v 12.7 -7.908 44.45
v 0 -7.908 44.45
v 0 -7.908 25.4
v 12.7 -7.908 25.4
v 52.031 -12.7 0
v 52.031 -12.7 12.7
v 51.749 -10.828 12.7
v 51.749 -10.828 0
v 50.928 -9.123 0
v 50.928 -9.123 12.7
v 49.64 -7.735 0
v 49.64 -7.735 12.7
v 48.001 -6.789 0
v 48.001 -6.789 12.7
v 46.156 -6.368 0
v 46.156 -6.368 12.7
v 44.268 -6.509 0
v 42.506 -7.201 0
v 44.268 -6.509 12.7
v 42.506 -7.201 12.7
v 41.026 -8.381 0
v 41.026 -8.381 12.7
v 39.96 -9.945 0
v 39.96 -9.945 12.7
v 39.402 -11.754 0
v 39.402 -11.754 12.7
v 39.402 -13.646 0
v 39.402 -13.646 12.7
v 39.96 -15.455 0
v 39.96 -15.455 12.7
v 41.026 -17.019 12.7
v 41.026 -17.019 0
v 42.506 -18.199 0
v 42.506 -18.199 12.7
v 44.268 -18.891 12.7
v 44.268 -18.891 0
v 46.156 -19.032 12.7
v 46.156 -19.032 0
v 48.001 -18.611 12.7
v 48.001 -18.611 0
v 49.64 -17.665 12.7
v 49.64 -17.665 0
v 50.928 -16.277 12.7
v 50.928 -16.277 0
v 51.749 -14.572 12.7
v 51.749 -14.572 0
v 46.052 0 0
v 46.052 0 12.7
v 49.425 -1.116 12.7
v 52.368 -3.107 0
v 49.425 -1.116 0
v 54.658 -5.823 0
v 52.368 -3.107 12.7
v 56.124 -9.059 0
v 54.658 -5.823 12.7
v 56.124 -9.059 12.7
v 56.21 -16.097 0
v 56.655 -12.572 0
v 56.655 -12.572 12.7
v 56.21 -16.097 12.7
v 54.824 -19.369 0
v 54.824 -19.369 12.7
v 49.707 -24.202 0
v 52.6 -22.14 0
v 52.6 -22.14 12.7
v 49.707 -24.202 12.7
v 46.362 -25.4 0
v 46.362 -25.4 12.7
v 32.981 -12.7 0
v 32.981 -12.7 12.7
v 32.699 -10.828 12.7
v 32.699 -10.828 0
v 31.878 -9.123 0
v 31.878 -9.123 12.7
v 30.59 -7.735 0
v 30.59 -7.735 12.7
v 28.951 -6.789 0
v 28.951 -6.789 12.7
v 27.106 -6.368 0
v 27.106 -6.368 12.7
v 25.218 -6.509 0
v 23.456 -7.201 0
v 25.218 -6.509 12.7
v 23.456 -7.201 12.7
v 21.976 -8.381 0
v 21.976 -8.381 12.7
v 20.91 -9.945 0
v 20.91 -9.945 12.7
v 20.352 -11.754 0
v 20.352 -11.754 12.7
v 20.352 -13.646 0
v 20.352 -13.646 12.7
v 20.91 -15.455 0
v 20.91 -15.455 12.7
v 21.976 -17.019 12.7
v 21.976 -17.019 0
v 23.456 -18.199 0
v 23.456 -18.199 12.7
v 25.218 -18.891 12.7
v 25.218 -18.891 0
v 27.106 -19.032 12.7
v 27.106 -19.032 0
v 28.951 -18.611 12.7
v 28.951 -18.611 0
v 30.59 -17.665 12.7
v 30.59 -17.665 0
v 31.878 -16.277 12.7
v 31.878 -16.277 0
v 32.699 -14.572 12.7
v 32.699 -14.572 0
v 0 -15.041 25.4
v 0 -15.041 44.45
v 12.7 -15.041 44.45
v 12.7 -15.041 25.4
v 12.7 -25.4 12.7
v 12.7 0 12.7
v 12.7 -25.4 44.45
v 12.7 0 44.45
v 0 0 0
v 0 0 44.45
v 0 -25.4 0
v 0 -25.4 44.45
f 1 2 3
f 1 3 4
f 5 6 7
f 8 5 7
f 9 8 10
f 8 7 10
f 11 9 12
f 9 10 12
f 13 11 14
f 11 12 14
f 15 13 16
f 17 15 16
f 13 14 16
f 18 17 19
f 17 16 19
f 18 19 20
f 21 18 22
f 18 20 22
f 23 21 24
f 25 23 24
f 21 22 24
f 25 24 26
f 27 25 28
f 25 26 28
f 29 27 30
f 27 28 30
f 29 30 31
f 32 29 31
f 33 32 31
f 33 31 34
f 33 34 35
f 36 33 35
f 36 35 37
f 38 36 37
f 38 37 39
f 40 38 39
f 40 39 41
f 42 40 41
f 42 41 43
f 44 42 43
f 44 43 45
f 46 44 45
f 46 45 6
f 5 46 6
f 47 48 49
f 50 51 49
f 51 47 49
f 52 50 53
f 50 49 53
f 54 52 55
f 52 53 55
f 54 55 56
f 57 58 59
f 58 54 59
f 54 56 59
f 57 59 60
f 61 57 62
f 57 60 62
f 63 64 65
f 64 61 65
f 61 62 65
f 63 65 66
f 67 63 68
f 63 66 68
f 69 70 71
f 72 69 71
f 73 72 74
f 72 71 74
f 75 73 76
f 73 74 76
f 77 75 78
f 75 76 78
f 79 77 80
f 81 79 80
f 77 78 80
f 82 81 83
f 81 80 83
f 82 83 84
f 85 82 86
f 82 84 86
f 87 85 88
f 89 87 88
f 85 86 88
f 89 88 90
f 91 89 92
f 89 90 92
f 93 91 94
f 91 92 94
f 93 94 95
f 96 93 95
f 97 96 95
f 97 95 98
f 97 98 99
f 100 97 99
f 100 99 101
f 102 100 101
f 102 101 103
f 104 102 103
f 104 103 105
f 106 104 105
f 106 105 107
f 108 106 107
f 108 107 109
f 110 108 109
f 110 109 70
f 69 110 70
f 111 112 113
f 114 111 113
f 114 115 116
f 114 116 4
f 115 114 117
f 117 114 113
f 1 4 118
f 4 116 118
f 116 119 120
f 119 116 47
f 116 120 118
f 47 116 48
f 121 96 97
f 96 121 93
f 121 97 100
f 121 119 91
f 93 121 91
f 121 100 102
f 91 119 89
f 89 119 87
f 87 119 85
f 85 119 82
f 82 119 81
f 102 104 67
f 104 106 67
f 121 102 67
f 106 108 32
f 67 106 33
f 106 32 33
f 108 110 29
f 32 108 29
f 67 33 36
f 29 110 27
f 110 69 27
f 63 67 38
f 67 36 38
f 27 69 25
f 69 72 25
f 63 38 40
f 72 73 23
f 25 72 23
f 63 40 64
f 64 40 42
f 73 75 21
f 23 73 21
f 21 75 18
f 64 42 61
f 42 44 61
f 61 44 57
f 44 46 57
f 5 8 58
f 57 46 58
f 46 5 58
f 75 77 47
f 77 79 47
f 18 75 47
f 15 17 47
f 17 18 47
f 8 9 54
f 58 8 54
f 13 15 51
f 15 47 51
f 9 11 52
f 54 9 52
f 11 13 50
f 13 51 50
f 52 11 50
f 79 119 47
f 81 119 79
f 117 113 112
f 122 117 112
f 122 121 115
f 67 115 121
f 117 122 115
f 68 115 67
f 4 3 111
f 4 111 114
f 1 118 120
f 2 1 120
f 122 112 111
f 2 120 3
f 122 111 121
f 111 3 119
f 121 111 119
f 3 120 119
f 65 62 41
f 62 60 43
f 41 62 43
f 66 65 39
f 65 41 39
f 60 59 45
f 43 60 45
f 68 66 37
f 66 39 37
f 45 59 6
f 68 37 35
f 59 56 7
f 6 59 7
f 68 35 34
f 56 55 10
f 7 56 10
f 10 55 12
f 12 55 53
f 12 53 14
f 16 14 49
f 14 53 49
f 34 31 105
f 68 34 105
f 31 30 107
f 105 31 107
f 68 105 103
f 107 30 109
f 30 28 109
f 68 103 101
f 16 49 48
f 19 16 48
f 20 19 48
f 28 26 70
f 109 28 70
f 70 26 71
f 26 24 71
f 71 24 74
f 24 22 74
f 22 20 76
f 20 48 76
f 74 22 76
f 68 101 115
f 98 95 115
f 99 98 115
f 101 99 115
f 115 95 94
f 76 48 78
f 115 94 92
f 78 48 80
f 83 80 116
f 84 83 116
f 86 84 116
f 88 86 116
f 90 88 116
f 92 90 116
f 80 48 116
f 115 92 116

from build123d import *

# Parameters (mm, degrees)
F1_DEPTH = 25.4
F3_R     = 6.35
F4_DEPTH = 25.4
F6_DEPTH = 25.4
F7_W     = 12.7
F7_H     = 7.132675
F8_DEPTH = 19.05


with BuildPart() as f1:
    # F0 (on Front) → F1 (new body)
    with BuildSketch(Plane.XZ):
        Polygon((0, 44.45), (0, 0), (57.15, 0), (57.15, 12.7), (12.7, 12.7), (12.7, 44.45), align=None)
    extrude(amount=F1_DEPTH)

    # F3 (on face) → F4 (cut)
    with BuildSketch(Plane.XY.offset(12.7)):
        with Locations((26.631284, -12.7)):
            Circle(F3_R)
        with Locations((45.681284, -12.7)):
            Circle(F3_R)
    extrude(amount=-F4_DEPTH, mode=Mode.SUBTRACT)

    # F5 (on face) → F6 (cut)
    with BuildSketch(Plane.XY.offset(12.7)):
        with BuildLine():
            ThreePointArc((46.05227, 0), (56.65458, -12.572447), (46.362385, -25.4))
            Line((46.362385, -25.4), (57.15, -25.4))
            Line((57.15, -25.4), (57.15, 0))
            Line((57.15, 0), (46.05227, 0))
        make_face()
    extrude(amount=-F6_DEPTH, mode=Mode.SUBTRACT)

    # F7 (on face) → F8 (cut)
    with BuildSketch(Plane.XY.offset(44.45)):
        with Locations((6.35, -11.474303)):
            Rectangle(F7_W, F7_H)
    extrude(amount=-F8_DEPTH, mode=Mode.SUBTRACT)


solid = f1.part
